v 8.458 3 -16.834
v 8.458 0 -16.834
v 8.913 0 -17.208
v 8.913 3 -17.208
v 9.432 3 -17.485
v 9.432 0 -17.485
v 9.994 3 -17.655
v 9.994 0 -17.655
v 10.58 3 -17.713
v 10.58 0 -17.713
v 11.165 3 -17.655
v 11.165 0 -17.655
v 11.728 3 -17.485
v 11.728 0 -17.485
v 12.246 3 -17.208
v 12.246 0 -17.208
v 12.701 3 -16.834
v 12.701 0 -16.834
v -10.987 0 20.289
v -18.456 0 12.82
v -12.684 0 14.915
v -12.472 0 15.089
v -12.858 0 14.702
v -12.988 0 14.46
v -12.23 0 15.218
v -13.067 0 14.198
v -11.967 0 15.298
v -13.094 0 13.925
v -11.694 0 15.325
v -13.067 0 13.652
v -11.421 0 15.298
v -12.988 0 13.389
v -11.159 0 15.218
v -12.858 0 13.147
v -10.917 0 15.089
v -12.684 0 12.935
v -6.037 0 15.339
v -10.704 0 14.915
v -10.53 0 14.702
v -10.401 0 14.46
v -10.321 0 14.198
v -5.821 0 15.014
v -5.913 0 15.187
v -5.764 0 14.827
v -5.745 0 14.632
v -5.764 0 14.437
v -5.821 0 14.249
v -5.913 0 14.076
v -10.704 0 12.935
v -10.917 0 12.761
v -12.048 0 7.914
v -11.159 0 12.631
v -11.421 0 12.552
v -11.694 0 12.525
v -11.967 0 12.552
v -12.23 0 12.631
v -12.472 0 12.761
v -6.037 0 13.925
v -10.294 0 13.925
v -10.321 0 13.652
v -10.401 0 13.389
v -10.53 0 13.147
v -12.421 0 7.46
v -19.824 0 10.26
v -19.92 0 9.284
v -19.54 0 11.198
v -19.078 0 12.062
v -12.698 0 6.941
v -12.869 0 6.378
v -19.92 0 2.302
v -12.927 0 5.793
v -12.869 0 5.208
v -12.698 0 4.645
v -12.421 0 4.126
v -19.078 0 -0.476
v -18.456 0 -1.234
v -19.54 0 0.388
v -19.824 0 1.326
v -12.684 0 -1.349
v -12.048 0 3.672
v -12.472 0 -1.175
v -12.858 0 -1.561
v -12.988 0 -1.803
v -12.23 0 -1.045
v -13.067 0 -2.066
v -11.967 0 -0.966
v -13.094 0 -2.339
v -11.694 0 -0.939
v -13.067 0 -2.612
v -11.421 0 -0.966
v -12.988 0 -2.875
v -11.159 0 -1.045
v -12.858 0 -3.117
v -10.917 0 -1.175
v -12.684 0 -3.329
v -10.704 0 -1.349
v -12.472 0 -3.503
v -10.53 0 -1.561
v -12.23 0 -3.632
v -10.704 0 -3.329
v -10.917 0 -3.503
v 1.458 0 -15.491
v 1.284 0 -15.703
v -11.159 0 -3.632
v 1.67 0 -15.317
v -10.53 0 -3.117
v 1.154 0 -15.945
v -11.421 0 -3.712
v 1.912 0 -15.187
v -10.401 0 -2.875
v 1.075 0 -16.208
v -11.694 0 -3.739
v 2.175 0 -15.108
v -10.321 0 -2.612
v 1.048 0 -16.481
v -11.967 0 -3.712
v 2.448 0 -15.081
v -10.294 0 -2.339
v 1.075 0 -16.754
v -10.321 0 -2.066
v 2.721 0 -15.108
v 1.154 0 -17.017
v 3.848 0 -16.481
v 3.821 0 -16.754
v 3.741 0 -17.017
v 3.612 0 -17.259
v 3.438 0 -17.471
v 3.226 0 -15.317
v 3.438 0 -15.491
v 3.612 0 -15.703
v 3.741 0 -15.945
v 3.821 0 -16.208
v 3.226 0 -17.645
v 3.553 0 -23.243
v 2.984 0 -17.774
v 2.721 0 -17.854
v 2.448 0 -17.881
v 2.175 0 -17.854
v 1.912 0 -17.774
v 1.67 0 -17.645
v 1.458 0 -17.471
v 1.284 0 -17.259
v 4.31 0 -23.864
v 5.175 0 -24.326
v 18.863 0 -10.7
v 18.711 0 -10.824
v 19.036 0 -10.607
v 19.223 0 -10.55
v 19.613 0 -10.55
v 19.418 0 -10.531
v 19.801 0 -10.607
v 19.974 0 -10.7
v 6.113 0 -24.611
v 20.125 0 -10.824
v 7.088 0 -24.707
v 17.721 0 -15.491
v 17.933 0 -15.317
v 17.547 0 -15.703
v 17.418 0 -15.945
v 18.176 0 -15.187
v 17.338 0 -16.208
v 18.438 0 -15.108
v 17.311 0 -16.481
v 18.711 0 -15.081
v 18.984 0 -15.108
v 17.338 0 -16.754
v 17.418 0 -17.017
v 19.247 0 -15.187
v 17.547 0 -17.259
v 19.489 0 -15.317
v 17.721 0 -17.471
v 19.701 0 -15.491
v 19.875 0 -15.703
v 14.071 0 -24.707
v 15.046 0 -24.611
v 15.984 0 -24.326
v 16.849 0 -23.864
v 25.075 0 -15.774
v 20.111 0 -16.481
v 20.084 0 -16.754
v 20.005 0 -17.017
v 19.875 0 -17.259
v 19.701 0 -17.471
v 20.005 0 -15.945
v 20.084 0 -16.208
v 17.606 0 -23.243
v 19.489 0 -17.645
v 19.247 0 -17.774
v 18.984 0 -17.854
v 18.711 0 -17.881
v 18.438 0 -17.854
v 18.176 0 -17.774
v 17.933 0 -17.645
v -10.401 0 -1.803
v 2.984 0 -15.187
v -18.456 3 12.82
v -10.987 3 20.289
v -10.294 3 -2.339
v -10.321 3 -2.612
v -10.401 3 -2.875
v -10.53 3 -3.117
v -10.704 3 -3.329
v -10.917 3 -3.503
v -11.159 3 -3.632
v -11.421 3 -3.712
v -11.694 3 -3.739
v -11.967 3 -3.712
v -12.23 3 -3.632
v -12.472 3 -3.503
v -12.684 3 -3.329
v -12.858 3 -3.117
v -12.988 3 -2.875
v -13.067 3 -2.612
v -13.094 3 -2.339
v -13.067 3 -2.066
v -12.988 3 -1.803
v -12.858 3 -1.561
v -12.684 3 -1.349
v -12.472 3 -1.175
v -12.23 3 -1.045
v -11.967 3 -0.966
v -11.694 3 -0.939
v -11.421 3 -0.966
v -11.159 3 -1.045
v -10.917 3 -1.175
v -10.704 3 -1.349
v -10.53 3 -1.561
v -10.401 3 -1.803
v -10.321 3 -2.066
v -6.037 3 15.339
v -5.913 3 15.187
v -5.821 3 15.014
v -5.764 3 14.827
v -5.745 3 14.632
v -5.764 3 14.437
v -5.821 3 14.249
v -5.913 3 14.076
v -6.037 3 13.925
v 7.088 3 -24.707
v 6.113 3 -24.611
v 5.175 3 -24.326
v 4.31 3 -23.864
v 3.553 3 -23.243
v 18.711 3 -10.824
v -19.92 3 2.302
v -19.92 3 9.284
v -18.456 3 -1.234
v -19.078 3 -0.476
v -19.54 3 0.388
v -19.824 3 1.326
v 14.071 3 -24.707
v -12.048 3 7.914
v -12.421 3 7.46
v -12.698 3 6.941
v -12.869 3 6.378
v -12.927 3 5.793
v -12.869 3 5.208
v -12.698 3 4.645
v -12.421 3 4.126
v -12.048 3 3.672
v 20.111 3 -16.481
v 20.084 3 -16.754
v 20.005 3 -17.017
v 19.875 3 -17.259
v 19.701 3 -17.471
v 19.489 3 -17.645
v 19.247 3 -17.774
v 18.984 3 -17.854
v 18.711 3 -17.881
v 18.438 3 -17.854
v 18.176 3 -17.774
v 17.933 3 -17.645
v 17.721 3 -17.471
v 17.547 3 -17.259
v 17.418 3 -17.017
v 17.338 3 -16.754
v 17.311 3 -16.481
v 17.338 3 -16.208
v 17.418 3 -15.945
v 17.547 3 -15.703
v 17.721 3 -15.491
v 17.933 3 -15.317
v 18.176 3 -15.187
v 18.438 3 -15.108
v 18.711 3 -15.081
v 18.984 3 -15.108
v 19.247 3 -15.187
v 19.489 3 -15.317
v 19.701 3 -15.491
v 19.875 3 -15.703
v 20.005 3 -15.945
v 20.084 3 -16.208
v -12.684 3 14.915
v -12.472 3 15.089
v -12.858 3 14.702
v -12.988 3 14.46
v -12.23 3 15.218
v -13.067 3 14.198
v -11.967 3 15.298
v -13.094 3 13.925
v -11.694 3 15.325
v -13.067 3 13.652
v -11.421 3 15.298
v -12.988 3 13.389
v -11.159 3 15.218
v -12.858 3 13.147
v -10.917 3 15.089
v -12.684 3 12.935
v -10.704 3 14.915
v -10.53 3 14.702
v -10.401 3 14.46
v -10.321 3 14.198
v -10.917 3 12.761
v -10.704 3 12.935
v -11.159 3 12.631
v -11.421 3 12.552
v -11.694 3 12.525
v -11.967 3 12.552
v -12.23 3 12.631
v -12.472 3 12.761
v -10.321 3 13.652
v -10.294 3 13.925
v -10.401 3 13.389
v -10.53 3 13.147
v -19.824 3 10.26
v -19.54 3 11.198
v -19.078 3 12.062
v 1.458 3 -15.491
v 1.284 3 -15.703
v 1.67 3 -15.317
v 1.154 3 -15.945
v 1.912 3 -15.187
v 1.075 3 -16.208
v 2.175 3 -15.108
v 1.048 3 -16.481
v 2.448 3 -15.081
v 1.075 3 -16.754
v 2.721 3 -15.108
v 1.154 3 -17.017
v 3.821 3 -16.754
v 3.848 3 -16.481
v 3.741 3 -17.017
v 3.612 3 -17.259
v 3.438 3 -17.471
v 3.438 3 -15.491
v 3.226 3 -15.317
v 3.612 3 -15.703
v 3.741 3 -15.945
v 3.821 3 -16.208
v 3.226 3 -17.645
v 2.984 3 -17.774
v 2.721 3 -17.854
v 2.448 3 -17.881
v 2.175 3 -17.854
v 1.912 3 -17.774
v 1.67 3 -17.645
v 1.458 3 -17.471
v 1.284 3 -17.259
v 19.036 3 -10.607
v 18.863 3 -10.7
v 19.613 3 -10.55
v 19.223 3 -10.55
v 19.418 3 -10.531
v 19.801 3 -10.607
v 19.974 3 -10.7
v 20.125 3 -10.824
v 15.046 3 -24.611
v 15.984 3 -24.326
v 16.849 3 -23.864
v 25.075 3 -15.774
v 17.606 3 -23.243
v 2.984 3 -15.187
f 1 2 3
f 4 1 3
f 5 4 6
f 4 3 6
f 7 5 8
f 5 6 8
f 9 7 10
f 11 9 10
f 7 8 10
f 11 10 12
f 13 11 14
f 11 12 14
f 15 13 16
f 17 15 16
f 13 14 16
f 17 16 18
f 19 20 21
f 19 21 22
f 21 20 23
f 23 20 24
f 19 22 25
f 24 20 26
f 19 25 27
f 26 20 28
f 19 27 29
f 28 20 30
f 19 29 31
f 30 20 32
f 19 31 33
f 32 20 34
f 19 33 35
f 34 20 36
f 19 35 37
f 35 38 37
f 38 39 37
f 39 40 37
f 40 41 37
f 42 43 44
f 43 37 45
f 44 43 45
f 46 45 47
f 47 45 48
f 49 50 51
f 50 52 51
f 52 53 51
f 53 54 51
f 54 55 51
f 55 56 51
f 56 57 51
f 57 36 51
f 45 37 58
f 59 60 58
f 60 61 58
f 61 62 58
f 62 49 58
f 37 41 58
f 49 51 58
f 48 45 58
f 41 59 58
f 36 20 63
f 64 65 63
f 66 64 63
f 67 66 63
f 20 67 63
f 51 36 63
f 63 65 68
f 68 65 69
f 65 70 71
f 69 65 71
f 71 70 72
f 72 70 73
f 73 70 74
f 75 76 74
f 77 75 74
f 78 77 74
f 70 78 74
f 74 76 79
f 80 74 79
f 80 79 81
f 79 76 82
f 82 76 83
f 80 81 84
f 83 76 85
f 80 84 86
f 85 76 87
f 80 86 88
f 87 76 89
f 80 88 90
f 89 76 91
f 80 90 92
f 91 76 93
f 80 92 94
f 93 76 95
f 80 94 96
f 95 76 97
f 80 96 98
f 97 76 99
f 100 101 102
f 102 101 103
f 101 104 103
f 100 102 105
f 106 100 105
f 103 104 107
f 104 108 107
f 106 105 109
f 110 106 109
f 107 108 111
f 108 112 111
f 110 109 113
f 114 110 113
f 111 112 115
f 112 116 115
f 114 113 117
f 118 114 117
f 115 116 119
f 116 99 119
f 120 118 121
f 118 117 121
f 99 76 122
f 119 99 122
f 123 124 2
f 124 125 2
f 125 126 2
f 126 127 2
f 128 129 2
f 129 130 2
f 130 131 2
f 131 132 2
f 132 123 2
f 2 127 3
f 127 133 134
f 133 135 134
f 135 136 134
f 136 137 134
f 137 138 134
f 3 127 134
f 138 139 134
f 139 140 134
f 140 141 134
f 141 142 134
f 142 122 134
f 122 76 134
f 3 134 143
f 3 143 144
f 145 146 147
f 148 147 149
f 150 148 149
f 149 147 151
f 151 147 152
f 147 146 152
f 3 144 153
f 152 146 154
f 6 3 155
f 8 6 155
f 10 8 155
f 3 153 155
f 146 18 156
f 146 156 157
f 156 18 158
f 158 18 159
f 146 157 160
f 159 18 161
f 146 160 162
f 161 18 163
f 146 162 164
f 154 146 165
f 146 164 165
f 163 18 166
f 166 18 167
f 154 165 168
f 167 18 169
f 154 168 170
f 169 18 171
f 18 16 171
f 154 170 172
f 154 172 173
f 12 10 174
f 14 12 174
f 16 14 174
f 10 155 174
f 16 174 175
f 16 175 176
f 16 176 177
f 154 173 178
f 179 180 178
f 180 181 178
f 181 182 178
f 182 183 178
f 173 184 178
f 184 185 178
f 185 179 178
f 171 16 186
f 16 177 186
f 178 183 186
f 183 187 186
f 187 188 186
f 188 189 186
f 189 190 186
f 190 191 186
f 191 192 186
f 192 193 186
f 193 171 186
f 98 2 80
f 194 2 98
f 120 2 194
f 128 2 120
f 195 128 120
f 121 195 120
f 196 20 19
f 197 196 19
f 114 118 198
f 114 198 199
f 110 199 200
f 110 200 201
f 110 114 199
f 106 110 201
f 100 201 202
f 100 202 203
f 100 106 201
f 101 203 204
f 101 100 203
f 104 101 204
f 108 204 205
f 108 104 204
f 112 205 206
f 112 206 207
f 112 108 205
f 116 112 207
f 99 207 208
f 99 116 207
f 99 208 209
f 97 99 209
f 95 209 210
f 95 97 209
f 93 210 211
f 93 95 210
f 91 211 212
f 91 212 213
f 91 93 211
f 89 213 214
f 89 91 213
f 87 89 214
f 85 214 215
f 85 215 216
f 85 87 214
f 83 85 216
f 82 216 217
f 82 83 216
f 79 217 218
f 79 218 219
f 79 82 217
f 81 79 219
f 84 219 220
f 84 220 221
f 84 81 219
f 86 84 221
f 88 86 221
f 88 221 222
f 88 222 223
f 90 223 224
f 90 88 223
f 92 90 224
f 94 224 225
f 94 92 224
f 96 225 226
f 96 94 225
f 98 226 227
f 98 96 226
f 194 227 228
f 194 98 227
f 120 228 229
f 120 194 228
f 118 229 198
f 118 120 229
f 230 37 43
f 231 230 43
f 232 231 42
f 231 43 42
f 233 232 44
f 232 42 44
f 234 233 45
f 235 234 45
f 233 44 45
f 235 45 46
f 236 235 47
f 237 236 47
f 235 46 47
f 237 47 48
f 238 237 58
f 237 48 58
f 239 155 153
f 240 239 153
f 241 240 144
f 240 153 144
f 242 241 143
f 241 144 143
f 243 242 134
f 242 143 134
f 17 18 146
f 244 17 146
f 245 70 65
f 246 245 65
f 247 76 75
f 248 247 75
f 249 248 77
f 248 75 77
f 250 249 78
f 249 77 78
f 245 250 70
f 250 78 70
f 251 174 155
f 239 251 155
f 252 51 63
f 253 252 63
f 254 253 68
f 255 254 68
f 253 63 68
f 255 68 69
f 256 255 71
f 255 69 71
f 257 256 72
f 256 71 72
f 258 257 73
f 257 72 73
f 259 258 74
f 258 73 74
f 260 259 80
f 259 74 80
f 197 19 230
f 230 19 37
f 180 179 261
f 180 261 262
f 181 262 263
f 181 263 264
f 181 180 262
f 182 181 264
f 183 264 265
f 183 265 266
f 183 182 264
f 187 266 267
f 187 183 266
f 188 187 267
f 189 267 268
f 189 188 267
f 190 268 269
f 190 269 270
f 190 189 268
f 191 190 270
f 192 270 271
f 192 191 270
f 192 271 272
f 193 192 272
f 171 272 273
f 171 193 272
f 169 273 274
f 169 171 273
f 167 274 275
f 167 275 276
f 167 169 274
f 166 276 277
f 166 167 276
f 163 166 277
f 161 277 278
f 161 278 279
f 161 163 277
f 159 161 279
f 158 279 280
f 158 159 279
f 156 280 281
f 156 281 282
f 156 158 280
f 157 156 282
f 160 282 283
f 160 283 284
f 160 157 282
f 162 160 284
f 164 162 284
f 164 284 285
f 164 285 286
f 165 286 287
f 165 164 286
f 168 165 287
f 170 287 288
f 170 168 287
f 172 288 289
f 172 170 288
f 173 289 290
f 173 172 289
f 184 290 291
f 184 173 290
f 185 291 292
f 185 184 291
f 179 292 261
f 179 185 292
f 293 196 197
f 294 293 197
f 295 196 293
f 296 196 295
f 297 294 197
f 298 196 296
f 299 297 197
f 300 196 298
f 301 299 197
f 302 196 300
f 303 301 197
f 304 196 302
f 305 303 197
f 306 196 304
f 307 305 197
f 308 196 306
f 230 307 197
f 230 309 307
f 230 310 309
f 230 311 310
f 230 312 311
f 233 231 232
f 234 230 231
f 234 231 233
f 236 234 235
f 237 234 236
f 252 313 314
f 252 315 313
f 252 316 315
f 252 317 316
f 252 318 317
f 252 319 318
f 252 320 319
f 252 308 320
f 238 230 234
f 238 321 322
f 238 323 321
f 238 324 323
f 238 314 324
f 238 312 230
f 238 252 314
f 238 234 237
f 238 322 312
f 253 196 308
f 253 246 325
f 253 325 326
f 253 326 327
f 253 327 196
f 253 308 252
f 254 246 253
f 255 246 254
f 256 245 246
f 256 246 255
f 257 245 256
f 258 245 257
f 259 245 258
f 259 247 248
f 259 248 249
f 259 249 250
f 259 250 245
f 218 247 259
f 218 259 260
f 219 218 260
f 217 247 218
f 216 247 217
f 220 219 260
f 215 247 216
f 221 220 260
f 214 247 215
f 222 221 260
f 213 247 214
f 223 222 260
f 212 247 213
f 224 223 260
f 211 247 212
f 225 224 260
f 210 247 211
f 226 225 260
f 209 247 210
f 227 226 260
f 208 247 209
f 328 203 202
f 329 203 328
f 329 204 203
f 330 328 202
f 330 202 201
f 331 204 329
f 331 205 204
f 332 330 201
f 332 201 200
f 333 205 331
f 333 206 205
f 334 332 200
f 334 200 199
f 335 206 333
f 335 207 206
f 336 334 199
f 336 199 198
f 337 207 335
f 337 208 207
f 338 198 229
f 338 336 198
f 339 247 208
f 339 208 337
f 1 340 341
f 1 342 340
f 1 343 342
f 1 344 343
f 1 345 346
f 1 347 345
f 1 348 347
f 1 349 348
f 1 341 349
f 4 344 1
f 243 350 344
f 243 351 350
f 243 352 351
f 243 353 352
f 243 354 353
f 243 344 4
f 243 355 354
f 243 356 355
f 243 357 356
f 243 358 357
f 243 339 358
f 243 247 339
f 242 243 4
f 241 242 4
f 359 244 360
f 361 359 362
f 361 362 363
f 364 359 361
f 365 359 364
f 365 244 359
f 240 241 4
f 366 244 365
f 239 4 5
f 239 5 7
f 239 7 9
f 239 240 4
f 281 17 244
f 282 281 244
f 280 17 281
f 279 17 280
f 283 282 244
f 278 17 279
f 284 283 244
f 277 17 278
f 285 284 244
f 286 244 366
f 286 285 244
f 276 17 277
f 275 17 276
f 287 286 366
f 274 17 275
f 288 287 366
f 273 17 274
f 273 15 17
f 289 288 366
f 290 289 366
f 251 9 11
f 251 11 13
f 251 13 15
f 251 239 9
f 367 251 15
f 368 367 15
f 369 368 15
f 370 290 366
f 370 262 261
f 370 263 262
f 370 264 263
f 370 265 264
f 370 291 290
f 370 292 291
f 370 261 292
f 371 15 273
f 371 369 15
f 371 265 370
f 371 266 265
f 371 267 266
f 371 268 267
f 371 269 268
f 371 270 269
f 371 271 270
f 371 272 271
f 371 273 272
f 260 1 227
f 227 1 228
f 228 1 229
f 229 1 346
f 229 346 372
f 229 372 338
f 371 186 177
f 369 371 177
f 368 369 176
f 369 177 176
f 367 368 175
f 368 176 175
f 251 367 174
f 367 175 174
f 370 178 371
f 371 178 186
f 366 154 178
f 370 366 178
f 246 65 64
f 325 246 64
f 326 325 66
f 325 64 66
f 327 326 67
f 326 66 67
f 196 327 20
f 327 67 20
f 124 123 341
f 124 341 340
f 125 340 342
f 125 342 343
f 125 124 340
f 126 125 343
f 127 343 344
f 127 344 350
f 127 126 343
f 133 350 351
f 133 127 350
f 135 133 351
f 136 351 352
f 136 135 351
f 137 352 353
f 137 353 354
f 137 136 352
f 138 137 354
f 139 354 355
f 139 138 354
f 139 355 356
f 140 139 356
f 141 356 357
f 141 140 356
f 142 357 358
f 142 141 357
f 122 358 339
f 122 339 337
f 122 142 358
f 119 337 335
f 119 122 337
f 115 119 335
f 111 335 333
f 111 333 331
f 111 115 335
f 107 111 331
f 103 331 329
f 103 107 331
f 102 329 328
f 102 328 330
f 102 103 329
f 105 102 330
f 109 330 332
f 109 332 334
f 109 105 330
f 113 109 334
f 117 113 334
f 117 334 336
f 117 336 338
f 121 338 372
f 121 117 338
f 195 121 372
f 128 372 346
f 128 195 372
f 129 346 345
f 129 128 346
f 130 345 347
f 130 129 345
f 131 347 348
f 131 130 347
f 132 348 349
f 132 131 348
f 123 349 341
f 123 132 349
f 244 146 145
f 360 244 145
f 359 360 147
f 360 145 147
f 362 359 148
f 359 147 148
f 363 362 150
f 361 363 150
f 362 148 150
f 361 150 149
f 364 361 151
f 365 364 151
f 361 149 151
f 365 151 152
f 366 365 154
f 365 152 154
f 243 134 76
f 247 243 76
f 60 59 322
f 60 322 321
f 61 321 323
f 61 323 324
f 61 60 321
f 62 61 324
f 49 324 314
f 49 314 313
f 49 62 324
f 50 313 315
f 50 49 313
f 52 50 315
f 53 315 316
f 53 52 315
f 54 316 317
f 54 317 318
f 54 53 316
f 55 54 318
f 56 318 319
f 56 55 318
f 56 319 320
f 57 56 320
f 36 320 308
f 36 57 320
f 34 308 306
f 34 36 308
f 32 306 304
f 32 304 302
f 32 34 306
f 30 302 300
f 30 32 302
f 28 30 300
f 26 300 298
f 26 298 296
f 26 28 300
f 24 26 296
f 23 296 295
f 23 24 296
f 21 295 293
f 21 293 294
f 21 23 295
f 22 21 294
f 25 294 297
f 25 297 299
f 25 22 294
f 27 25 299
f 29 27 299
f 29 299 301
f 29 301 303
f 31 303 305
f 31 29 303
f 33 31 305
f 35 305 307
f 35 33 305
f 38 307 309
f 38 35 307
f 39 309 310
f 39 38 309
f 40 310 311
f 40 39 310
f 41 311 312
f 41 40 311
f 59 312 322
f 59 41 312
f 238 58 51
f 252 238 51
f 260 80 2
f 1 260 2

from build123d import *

# Parameters (mm, degrees)
SKETCH1_R           = 1.4
BOSS_EXTRUDE1_DEPTH = 3


with BuildPart() as part:
    # Sketch1 → Boss-Extrude1 (new body)
    with BuildSketch(Plane(origin=(0, 0, 0), x_dir=(1, 0, 0), z_dir=(0, 1, 0))):
        with BuildLine():
            Line((-6.037453791, -13.924683413), (-12.047861431, -7.914275773))
            ThreePointArc((-12.047861431, -7.914275773), (-12.926541087, -5.792955429), (-12.047861431, -3.671635086))
            Line((-12.047861431, -3.671635086), (8.458235223, 16.834461569))
            ThreePointArc((8.458235223, 16.834461569), (10.579555567, 17.713141225), (12.700875911, 16.834461569))
            Line((12.700875911, 16.834461569), (18.711283551, 10.824053929))
            ThreePointArc((18.711283551, 10.824053929), (19.418390332, 10.53116071), (20.125497113, 10.824053929))
            Line((20.125497113, 10.824053929), (25.075244581, 15.773801397))
            Line((25.075244581, 15.773801397), (17.606467502, 23.242578477))
            ThreePointArc((17.606467502, 23.242578477), (15.984350757, 24.326442233), (14.070933596, 24.707044571))
            Line((14.070933596, 24.707044571), (7.088177538, 24.707044571))
            ThreePointArc((7.088177538, 24.707044571), (5.174760376, 24.326442233), (3.552643632, 23.242578477))
            Line((3.552643632, 23.242578477), (-18.455978339, 1.233956505))
            ThreePointArc((-18.455978339, 1.233956505), (-19.539842096, -0.388160239), (-19.920444433, -2.301577401))
            Line((-19.920444433, -2.301577401), (-19.920444433, -9.284333458))
            ThreePointArc((-19.920444433, -9.284333458), (-19.539842096, -11.19775062), (-18.455978339, -12.819867364))
            Line((-18.455978339, -12.819867364), (-10.987201259, -20.288644444))
            Line((-10.987201259, -20.288644444), (-6.037453791, -15.338896975))
            ThreePointArc((-6.037453791, -15.338896975), (-5.744560572, -14.631790194), (-6.037453791, -13.924683413))
        make_face()
        with Locations((18.711283551, 16.480908178)):
            Circle(SKETCH1_R, mode=Mode.SUBTRACT)
        with Locations((2.447827583, 16.480908178)):
            Circle(SKETCH1_R, mode=Mode.SUBTRACT)
        with Locations((-11.69430804, 2.338772554)):
            Circle(SKETCH1_R, mode=Mode.SUBTRACT)
        with Locations((-11.69430804, -13.924683413)):
            Circle(SKETCH1_R, mode=Mode.SUBTRACT)
    extrude(amount=BOSS_EXTRUDE1_DEPTH)


solid = part.part
